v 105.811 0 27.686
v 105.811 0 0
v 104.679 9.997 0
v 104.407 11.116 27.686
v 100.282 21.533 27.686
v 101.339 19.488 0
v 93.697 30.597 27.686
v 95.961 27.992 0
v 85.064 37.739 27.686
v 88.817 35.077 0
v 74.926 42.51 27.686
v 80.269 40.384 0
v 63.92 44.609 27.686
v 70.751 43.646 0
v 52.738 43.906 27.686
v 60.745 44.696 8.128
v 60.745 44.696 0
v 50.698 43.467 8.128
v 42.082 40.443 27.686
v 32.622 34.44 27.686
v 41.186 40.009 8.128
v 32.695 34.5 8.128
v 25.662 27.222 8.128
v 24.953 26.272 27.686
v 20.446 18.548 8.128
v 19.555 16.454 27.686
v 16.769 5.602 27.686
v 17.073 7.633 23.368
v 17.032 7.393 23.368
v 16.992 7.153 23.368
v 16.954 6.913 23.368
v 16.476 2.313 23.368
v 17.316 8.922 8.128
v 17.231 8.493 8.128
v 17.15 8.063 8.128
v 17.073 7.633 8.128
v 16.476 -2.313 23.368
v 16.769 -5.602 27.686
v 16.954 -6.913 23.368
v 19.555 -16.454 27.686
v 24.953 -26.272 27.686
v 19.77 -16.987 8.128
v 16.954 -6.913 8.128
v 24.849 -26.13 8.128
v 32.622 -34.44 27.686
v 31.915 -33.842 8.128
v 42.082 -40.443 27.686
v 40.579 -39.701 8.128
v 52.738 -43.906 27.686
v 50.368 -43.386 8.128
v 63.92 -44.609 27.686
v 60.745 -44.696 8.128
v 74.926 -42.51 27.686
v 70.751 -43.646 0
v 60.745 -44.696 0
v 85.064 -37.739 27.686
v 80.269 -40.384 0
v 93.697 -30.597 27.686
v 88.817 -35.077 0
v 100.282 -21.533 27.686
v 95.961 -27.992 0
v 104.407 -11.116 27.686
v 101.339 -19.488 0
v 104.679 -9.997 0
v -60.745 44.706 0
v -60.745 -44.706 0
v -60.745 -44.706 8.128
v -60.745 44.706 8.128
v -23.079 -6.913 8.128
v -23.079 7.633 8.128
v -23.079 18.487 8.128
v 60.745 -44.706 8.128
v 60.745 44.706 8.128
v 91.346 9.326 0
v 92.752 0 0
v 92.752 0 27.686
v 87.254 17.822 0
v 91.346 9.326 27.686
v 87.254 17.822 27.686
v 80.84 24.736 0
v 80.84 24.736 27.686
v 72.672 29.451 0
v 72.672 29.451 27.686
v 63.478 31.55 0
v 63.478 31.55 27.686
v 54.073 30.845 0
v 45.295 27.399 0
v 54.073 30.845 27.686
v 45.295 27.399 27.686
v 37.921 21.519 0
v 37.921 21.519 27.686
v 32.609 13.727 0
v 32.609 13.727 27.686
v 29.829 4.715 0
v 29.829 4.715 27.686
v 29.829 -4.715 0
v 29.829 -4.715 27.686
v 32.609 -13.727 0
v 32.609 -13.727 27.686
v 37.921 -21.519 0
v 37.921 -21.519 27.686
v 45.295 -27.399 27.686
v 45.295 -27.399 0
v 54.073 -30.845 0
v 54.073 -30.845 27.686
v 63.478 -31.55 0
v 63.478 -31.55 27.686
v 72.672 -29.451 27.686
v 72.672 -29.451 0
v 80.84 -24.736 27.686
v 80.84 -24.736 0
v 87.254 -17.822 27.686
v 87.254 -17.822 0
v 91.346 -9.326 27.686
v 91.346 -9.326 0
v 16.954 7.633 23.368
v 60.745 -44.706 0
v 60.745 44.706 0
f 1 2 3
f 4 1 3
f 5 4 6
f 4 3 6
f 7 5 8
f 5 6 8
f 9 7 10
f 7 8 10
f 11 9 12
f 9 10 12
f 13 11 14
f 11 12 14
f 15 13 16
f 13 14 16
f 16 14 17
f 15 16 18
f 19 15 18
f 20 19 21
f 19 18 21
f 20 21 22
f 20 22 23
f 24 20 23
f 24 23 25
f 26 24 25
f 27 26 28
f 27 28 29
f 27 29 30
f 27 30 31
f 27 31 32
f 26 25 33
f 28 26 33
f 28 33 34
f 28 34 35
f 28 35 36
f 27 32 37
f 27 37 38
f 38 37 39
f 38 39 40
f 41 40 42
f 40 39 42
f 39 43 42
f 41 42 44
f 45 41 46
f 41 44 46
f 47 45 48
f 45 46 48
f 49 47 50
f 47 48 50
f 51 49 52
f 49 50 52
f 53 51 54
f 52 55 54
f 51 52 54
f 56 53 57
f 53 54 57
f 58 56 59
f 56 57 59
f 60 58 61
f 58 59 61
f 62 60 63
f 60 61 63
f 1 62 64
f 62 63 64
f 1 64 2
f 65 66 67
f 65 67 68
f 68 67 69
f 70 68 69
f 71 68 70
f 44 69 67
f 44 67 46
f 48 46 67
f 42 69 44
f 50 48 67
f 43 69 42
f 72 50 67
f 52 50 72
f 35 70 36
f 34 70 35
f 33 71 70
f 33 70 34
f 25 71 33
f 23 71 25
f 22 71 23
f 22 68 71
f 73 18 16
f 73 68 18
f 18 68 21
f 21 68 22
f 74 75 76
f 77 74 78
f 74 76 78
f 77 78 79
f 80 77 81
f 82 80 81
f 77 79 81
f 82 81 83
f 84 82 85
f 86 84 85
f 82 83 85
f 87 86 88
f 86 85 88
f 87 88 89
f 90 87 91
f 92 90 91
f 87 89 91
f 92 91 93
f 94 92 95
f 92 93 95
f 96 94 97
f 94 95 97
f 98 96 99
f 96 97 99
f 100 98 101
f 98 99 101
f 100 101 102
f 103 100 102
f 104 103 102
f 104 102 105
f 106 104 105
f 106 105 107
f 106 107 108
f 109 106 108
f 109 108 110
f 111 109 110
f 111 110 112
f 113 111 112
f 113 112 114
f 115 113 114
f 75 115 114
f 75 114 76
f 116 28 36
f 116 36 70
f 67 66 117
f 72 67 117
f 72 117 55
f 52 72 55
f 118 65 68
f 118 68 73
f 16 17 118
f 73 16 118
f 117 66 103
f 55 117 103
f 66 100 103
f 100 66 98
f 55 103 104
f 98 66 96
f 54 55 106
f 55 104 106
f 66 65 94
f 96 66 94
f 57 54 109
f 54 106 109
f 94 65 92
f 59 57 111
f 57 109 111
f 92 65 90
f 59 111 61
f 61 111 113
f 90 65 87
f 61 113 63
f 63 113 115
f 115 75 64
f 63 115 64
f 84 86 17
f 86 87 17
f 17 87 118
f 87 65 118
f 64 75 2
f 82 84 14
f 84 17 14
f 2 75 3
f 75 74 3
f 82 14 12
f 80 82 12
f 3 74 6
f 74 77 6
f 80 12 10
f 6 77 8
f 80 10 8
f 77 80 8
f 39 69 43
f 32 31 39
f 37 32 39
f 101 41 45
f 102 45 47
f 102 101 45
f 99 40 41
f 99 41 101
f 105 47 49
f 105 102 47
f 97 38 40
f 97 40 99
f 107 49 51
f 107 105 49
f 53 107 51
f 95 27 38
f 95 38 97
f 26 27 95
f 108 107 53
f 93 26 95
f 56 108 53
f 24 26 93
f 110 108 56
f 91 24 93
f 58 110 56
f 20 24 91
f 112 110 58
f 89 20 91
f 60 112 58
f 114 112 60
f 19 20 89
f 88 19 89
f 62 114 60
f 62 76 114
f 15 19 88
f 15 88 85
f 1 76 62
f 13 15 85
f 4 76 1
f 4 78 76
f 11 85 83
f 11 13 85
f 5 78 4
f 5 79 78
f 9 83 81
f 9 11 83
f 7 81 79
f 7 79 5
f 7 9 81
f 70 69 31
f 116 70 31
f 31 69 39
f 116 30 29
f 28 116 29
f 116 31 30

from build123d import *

# Parameters (mm, degrees)
F0_W      = 121.4898377657
F0_H      = 89.4121006131
F1_DEPTH  = 8.128
F2_R      = 44.6973060351
F3_DEPTH  = 27.686
F4_R      = 31.6381794564
F5_DEPTH  = 71.12
F7_DEPTH  = 12.7
F9_DEPTH  = 15.24
F11_DEPTH = 25.4


with BuildPart() as f1:
    # F0 (on Top) → F1 (new body)
    with BuildSketch(Plane.XY):
        Rectangle(F0_W, F0_H)
    extrude(amount=F1_DEPTH)

    # F2 (on Top) → F3 (join)
    with BuildSketch(Plane.XY):
        with Locations((61.1136257648, 0)):
            Circle(F2_R)
    extrude(amount=F3_DEPTH)

    # F4 (on face) → F5 (cut)
    with BuildSketch(Plane.XY.offset(27.686)):
        with Locations((61.1136257648, 0)):
            Circle(F4_R)
    extrude(amount=-F5_DEPTH, mode=Mode.SUBTRACT)

    # F6 (on face) → F7 (join)
    with BuildSketch(Plane.XY.offset(8.128)):
        with BuildLine():
            Line((17.315906262, -5.9659900144), (17.315906262, 8.9223838266))
            ThreePointArc((17.315906262, 8.9223838266), (16.4414678757, 1.4991585393), (16.8162654603, -5.9659900144))
            Line((16.8162654604, -5.9659900144), (17.315906262, -5.9659900144))
        make_face()
    extrude(amount=F7_DEPTH)

    # F8 (on face) → F9 (join)
    with BuildSketch(Plane.XY.offset(8.128)):
        with BuildLine():
            ThreePointArc((16.9541946333, -6.9133066572), (16.4178062292, 0.3645309758), (17.0728288242, 7.6326516773))
            Line((17.0728288242, 7.6326516773), (-23.0794530362, 7.6326516773))
            Line((-23.0794530362, 7.6326516773), (-23.0794530362, -6.9133066572))
            Line((-23.0794530362, -6.9133066572), (16.9541946333, -6.9133066572))
        make_face()
    extrude(amount=F9_DEPTH)

    # F10 (on face) → F11 (cut)
    with BuildSketch(Plane.XZ.offset(6.9133066572)):
        Polygon((-23.0794530362, 23.368), (-23.0794530362, 8.128), (16.9541946333, 23.368), align=None)
    extrude(amount=-F11_DEPTH, mode=Mode.SUBTRACT)


solid = f1.part
